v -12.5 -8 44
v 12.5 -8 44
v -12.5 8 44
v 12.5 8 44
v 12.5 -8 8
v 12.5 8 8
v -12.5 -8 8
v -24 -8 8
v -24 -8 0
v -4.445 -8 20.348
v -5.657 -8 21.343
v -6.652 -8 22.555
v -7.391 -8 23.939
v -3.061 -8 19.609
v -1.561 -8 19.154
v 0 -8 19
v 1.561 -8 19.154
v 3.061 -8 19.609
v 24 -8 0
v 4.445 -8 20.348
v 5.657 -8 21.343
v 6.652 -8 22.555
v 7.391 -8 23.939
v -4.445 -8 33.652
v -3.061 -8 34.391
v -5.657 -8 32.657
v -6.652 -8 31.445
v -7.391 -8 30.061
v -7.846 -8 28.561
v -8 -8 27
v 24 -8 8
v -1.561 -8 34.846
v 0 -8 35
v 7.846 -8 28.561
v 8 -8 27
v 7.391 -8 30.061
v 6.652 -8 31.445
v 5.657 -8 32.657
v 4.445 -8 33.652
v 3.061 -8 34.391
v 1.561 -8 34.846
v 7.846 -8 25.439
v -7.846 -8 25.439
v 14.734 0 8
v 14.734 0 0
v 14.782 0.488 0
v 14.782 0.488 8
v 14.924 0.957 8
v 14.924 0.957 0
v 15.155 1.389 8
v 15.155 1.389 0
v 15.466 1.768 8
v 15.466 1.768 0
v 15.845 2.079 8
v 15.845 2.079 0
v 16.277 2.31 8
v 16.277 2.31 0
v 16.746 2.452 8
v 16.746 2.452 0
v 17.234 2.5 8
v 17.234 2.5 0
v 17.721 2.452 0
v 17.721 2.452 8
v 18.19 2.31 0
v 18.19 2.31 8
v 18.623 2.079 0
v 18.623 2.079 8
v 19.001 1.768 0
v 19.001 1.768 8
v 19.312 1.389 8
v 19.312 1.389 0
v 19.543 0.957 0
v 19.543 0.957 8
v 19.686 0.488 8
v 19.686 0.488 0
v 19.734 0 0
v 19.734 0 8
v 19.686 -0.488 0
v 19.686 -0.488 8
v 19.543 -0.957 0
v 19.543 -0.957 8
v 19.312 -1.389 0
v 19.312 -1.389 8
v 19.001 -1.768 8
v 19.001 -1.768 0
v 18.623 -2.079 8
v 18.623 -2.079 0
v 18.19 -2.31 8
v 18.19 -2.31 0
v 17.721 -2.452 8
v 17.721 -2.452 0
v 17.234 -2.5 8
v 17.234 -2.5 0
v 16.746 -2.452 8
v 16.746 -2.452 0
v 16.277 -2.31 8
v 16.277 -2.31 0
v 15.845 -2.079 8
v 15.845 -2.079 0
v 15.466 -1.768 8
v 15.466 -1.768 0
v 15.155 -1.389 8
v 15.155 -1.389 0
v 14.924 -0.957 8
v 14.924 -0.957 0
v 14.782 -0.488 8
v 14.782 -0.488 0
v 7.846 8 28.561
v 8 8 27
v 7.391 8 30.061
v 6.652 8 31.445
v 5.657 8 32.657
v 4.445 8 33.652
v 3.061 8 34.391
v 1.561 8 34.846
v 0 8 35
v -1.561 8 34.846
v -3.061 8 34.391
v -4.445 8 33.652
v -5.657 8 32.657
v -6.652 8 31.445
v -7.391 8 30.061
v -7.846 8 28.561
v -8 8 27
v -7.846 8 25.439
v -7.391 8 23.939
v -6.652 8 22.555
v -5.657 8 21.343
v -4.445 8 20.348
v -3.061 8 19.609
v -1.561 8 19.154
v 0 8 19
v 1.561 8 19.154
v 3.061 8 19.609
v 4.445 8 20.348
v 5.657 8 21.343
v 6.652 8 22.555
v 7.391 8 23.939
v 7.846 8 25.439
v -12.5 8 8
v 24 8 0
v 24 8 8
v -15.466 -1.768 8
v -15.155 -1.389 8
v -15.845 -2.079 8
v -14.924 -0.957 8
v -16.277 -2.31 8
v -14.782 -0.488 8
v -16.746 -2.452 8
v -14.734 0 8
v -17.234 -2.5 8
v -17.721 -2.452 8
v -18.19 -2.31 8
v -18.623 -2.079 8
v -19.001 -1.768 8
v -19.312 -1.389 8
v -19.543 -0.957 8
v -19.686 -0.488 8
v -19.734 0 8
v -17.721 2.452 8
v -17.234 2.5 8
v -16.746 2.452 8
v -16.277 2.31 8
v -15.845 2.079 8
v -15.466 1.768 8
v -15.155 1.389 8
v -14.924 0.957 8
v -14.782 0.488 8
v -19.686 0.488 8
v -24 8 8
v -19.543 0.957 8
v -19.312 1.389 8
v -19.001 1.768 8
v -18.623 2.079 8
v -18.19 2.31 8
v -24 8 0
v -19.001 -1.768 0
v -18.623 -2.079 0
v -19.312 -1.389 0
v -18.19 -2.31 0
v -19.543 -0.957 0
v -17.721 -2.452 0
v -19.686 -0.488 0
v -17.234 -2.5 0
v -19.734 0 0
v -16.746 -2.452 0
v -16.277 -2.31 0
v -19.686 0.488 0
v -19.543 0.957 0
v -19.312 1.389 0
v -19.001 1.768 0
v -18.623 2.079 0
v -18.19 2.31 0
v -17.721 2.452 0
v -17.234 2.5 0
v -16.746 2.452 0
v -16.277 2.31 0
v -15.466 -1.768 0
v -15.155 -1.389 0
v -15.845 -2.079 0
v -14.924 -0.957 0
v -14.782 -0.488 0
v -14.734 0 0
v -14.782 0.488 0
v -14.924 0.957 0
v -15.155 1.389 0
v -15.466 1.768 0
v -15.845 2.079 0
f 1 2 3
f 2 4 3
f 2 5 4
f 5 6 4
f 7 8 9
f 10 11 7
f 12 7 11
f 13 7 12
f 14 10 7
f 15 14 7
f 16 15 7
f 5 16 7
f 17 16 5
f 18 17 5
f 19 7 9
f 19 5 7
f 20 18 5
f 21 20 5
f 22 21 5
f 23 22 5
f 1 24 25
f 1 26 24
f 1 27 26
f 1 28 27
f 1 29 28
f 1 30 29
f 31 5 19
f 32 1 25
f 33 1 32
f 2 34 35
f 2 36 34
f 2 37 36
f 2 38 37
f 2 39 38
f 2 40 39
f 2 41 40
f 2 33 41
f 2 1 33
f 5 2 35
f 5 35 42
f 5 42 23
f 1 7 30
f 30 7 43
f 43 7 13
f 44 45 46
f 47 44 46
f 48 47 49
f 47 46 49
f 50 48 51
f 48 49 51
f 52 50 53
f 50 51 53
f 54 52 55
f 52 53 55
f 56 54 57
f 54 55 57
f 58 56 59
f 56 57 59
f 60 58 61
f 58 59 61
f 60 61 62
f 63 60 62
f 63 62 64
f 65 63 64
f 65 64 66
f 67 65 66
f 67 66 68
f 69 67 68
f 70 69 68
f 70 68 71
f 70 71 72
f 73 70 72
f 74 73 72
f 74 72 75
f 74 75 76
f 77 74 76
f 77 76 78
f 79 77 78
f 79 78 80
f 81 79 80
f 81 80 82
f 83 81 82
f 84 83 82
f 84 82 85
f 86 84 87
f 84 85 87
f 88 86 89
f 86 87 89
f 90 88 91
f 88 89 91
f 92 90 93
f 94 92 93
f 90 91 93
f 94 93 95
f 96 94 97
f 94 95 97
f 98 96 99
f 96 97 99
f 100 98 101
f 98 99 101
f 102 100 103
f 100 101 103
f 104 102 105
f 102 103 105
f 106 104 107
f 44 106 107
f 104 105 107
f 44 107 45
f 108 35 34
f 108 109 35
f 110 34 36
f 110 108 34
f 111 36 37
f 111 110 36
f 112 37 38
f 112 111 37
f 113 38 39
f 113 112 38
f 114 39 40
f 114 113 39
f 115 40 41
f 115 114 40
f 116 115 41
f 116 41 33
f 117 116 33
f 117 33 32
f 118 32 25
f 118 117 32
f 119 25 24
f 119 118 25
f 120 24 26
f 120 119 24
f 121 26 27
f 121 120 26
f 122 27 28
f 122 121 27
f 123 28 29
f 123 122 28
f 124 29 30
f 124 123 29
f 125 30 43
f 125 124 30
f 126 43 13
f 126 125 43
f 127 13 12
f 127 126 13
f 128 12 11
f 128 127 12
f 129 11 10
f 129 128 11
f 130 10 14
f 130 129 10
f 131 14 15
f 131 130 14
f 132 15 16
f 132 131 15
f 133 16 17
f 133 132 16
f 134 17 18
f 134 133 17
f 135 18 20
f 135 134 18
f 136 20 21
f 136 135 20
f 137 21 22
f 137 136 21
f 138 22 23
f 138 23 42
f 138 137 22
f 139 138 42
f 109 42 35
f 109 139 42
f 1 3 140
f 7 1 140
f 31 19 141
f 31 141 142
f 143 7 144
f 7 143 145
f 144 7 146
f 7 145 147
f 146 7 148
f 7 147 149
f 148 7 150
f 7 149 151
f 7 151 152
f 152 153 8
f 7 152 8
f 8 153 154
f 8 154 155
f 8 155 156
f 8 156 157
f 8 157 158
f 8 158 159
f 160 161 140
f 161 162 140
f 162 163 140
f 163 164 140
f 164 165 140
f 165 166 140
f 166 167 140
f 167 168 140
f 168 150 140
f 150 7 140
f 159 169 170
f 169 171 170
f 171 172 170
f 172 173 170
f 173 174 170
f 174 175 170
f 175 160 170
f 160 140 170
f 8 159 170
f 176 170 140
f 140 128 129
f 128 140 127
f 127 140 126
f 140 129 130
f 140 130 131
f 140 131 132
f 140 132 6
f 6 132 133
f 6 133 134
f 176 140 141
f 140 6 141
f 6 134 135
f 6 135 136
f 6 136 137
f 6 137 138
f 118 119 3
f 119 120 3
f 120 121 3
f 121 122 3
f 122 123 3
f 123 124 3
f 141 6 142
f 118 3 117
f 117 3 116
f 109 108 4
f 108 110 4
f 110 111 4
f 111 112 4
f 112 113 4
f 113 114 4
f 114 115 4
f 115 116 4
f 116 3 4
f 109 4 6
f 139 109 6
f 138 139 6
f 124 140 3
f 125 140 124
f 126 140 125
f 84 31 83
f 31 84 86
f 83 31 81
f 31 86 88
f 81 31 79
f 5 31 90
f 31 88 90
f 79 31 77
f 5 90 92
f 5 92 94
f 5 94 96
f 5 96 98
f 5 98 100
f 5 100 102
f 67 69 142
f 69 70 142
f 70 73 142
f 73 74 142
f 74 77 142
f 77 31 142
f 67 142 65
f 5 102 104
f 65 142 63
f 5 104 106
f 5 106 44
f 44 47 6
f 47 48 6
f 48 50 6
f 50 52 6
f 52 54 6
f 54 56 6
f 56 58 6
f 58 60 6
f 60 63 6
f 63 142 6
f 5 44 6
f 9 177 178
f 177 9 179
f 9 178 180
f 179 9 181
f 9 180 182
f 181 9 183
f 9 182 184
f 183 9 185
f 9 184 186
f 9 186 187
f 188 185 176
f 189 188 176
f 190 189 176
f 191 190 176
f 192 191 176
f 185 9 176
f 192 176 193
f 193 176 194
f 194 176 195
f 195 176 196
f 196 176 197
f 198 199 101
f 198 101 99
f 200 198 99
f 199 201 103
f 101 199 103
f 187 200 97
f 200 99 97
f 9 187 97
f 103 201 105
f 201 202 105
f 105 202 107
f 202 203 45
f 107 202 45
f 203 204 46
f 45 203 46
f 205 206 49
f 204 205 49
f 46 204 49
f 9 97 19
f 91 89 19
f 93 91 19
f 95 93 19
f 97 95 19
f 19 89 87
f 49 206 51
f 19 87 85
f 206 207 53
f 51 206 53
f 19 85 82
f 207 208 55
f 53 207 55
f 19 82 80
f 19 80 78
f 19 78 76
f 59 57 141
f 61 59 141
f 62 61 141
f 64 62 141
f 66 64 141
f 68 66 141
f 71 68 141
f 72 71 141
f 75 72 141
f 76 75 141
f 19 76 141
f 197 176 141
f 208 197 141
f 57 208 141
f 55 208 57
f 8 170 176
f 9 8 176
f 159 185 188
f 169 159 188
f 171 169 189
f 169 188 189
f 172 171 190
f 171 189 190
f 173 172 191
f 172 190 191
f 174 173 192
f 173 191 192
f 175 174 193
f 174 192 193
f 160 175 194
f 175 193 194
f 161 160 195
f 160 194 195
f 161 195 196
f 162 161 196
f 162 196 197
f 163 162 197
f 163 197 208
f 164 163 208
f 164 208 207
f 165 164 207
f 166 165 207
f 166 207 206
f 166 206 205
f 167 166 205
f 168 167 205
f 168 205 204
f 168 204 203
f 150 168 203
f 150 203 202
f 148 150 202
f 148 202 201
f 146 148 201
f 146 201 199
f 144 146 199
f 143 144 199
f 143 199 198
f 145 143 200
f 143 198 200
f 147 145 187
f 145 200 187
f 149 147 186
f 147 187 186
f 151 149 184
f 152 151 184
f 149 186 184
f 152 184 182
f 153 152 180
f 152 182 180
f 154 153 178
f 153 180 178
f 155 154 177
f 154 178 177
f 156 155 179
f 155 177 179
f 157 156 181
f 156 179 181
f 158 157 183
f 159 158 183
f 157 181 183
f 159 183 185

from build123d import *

# Parameters (mm, degrees)
F0_R          = 8
F1_DEPTH      = 8
F1_DEPTH_BACK = 8
F3_D          = 5


with BuildPart() as f1:
    # F0 (on Front) → F1 (new body, two sides)
    with BuildSketch(Plane.XZ) as f1_sk:
        Polygon((-24, 0), (0, 0), (24, 0), (24, 8), (12.5, 8), (12.5, 44), (0, 44), (-12.5, 44), (-12.5, 8), (-24, 8), align=None)
        with Locations((0, 27)):
            Circle(F0_R, mode=Mode.SUBTRACT)
    extrude(amount=-F1_DEPTH)
    extrude(f1_sk.sketch, amount=F1_DEPTH_BACK)

    # F3 (through all)
    with Locations(Plane.XY.offset(8)):
        with Locations((-17.2336879396, 0), (17.2336879396, 0)):
            Hole(F3_D / 2)


solid = f1.part
